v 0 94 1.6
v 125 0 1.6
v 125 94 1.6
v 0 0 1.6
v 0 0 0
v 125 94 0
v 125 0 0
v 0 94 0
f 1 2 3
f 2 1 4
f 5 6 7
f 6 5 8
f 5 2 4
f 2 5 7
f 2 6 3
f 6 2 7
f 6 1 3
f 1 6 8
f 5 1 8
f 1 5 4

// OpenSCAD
// PlataVM PCB-D POWER_5V component-envelope model
// Version: V1.9
// Purpose: two-phase buck bounding-box and height review only.
// No final parts, footprints, mounting holes, copper, connectors or production geometry.

$fn = 48;

board_x = 125;
board_y = 94;
board_t = 1.6;
height_limit = 23;

module board() {
    cube([board_x, board_y, board_t]);
}

module envelope(pos, size, label="") {
    translate([pos[0], pos[1], board_t + pos[2]])
        %cube(size);
}

module height_limit_plane() {
    translate([0, 0, board_t + height_limit])
        %cube([board_x, board_y, 0.2]);
}

board();
height_limit_plane();

// Input protection and bulk input region.
envelope([4, 8, 0], [18, 22, 12], "INPUT_PROTECTION");
envelope([4, 34, 0], [22, 18, 12], "INPUT_BULK");

// Controller and current sensing.
envelope([31, 42, 0], [7, 7, 1.5], "CONTROLLER");
envelope([42, 17, 0], [7, 4, 1.5], "SHUNT_PHASE_1");
envelope([42, 57, 0], [7, 4, 1.5], "SHUNT_PHASE_2");

// Phase 1 half bridge, support and inductor.
envelope([31, 8, 0], [7, 6, 1.5], "HS_FET_1");
envelope([39, 8, 0], [7, 6, 1.5], "LS_FET_1");
envelope([31, 24, 0], [12, 8, 3], "GATE_SNUBBER_1");
envelope([49, 8, 0], [14, 10, 3], "LOCAL_CIN_1");
envelope([66, 8, 0], [13, 11, 11], "INDUCTOR_1");

// Phase 2 half bridge, support and inductor.
envelope([31, 68, 0], [7, 6, 1.5], "HS_FET_2");
envelope([39, 68, 0], [7, 6, 1.5], "LS_FET_2");
envelope([31, 54, 0], [12, 8, 3], "GATE_SNUBBER_2");
envelope([49, 68, 0], [14, 10, 3], "LOCAL_CIN_2");
envelope([66, 68, 0], [13, 11, 11], "INDUCTOR_2");

// Shared output capacitor banks.
envelope([83, 8, 0], [32, 16, 4], "OUTPUT_CERAMIC_BANK");
envelope([83, 28, 0], [34, 24, 16], "OUTPUT_POLYMER_BANK");

// Local MCU/CAN and provisional output-protection areas.
envelope([4, 70, 0], [18, 16, 5], "LOCAL_MCU_CAN");
envelope([26, 80, 0], [42, 10, 12], "OUTPUT_GROUP_1_5_PARTIAL");
envelope([72, 80, 0], [42, 10, 12], "OUTPUT_GROUP_6_10_PARTIAL");

// Reference outline for the preliminary 70 x 38 mm dual-phase power-stage cluster.
translate([29, 6, board_t])
    %cube([52, 74, 0.3]);
